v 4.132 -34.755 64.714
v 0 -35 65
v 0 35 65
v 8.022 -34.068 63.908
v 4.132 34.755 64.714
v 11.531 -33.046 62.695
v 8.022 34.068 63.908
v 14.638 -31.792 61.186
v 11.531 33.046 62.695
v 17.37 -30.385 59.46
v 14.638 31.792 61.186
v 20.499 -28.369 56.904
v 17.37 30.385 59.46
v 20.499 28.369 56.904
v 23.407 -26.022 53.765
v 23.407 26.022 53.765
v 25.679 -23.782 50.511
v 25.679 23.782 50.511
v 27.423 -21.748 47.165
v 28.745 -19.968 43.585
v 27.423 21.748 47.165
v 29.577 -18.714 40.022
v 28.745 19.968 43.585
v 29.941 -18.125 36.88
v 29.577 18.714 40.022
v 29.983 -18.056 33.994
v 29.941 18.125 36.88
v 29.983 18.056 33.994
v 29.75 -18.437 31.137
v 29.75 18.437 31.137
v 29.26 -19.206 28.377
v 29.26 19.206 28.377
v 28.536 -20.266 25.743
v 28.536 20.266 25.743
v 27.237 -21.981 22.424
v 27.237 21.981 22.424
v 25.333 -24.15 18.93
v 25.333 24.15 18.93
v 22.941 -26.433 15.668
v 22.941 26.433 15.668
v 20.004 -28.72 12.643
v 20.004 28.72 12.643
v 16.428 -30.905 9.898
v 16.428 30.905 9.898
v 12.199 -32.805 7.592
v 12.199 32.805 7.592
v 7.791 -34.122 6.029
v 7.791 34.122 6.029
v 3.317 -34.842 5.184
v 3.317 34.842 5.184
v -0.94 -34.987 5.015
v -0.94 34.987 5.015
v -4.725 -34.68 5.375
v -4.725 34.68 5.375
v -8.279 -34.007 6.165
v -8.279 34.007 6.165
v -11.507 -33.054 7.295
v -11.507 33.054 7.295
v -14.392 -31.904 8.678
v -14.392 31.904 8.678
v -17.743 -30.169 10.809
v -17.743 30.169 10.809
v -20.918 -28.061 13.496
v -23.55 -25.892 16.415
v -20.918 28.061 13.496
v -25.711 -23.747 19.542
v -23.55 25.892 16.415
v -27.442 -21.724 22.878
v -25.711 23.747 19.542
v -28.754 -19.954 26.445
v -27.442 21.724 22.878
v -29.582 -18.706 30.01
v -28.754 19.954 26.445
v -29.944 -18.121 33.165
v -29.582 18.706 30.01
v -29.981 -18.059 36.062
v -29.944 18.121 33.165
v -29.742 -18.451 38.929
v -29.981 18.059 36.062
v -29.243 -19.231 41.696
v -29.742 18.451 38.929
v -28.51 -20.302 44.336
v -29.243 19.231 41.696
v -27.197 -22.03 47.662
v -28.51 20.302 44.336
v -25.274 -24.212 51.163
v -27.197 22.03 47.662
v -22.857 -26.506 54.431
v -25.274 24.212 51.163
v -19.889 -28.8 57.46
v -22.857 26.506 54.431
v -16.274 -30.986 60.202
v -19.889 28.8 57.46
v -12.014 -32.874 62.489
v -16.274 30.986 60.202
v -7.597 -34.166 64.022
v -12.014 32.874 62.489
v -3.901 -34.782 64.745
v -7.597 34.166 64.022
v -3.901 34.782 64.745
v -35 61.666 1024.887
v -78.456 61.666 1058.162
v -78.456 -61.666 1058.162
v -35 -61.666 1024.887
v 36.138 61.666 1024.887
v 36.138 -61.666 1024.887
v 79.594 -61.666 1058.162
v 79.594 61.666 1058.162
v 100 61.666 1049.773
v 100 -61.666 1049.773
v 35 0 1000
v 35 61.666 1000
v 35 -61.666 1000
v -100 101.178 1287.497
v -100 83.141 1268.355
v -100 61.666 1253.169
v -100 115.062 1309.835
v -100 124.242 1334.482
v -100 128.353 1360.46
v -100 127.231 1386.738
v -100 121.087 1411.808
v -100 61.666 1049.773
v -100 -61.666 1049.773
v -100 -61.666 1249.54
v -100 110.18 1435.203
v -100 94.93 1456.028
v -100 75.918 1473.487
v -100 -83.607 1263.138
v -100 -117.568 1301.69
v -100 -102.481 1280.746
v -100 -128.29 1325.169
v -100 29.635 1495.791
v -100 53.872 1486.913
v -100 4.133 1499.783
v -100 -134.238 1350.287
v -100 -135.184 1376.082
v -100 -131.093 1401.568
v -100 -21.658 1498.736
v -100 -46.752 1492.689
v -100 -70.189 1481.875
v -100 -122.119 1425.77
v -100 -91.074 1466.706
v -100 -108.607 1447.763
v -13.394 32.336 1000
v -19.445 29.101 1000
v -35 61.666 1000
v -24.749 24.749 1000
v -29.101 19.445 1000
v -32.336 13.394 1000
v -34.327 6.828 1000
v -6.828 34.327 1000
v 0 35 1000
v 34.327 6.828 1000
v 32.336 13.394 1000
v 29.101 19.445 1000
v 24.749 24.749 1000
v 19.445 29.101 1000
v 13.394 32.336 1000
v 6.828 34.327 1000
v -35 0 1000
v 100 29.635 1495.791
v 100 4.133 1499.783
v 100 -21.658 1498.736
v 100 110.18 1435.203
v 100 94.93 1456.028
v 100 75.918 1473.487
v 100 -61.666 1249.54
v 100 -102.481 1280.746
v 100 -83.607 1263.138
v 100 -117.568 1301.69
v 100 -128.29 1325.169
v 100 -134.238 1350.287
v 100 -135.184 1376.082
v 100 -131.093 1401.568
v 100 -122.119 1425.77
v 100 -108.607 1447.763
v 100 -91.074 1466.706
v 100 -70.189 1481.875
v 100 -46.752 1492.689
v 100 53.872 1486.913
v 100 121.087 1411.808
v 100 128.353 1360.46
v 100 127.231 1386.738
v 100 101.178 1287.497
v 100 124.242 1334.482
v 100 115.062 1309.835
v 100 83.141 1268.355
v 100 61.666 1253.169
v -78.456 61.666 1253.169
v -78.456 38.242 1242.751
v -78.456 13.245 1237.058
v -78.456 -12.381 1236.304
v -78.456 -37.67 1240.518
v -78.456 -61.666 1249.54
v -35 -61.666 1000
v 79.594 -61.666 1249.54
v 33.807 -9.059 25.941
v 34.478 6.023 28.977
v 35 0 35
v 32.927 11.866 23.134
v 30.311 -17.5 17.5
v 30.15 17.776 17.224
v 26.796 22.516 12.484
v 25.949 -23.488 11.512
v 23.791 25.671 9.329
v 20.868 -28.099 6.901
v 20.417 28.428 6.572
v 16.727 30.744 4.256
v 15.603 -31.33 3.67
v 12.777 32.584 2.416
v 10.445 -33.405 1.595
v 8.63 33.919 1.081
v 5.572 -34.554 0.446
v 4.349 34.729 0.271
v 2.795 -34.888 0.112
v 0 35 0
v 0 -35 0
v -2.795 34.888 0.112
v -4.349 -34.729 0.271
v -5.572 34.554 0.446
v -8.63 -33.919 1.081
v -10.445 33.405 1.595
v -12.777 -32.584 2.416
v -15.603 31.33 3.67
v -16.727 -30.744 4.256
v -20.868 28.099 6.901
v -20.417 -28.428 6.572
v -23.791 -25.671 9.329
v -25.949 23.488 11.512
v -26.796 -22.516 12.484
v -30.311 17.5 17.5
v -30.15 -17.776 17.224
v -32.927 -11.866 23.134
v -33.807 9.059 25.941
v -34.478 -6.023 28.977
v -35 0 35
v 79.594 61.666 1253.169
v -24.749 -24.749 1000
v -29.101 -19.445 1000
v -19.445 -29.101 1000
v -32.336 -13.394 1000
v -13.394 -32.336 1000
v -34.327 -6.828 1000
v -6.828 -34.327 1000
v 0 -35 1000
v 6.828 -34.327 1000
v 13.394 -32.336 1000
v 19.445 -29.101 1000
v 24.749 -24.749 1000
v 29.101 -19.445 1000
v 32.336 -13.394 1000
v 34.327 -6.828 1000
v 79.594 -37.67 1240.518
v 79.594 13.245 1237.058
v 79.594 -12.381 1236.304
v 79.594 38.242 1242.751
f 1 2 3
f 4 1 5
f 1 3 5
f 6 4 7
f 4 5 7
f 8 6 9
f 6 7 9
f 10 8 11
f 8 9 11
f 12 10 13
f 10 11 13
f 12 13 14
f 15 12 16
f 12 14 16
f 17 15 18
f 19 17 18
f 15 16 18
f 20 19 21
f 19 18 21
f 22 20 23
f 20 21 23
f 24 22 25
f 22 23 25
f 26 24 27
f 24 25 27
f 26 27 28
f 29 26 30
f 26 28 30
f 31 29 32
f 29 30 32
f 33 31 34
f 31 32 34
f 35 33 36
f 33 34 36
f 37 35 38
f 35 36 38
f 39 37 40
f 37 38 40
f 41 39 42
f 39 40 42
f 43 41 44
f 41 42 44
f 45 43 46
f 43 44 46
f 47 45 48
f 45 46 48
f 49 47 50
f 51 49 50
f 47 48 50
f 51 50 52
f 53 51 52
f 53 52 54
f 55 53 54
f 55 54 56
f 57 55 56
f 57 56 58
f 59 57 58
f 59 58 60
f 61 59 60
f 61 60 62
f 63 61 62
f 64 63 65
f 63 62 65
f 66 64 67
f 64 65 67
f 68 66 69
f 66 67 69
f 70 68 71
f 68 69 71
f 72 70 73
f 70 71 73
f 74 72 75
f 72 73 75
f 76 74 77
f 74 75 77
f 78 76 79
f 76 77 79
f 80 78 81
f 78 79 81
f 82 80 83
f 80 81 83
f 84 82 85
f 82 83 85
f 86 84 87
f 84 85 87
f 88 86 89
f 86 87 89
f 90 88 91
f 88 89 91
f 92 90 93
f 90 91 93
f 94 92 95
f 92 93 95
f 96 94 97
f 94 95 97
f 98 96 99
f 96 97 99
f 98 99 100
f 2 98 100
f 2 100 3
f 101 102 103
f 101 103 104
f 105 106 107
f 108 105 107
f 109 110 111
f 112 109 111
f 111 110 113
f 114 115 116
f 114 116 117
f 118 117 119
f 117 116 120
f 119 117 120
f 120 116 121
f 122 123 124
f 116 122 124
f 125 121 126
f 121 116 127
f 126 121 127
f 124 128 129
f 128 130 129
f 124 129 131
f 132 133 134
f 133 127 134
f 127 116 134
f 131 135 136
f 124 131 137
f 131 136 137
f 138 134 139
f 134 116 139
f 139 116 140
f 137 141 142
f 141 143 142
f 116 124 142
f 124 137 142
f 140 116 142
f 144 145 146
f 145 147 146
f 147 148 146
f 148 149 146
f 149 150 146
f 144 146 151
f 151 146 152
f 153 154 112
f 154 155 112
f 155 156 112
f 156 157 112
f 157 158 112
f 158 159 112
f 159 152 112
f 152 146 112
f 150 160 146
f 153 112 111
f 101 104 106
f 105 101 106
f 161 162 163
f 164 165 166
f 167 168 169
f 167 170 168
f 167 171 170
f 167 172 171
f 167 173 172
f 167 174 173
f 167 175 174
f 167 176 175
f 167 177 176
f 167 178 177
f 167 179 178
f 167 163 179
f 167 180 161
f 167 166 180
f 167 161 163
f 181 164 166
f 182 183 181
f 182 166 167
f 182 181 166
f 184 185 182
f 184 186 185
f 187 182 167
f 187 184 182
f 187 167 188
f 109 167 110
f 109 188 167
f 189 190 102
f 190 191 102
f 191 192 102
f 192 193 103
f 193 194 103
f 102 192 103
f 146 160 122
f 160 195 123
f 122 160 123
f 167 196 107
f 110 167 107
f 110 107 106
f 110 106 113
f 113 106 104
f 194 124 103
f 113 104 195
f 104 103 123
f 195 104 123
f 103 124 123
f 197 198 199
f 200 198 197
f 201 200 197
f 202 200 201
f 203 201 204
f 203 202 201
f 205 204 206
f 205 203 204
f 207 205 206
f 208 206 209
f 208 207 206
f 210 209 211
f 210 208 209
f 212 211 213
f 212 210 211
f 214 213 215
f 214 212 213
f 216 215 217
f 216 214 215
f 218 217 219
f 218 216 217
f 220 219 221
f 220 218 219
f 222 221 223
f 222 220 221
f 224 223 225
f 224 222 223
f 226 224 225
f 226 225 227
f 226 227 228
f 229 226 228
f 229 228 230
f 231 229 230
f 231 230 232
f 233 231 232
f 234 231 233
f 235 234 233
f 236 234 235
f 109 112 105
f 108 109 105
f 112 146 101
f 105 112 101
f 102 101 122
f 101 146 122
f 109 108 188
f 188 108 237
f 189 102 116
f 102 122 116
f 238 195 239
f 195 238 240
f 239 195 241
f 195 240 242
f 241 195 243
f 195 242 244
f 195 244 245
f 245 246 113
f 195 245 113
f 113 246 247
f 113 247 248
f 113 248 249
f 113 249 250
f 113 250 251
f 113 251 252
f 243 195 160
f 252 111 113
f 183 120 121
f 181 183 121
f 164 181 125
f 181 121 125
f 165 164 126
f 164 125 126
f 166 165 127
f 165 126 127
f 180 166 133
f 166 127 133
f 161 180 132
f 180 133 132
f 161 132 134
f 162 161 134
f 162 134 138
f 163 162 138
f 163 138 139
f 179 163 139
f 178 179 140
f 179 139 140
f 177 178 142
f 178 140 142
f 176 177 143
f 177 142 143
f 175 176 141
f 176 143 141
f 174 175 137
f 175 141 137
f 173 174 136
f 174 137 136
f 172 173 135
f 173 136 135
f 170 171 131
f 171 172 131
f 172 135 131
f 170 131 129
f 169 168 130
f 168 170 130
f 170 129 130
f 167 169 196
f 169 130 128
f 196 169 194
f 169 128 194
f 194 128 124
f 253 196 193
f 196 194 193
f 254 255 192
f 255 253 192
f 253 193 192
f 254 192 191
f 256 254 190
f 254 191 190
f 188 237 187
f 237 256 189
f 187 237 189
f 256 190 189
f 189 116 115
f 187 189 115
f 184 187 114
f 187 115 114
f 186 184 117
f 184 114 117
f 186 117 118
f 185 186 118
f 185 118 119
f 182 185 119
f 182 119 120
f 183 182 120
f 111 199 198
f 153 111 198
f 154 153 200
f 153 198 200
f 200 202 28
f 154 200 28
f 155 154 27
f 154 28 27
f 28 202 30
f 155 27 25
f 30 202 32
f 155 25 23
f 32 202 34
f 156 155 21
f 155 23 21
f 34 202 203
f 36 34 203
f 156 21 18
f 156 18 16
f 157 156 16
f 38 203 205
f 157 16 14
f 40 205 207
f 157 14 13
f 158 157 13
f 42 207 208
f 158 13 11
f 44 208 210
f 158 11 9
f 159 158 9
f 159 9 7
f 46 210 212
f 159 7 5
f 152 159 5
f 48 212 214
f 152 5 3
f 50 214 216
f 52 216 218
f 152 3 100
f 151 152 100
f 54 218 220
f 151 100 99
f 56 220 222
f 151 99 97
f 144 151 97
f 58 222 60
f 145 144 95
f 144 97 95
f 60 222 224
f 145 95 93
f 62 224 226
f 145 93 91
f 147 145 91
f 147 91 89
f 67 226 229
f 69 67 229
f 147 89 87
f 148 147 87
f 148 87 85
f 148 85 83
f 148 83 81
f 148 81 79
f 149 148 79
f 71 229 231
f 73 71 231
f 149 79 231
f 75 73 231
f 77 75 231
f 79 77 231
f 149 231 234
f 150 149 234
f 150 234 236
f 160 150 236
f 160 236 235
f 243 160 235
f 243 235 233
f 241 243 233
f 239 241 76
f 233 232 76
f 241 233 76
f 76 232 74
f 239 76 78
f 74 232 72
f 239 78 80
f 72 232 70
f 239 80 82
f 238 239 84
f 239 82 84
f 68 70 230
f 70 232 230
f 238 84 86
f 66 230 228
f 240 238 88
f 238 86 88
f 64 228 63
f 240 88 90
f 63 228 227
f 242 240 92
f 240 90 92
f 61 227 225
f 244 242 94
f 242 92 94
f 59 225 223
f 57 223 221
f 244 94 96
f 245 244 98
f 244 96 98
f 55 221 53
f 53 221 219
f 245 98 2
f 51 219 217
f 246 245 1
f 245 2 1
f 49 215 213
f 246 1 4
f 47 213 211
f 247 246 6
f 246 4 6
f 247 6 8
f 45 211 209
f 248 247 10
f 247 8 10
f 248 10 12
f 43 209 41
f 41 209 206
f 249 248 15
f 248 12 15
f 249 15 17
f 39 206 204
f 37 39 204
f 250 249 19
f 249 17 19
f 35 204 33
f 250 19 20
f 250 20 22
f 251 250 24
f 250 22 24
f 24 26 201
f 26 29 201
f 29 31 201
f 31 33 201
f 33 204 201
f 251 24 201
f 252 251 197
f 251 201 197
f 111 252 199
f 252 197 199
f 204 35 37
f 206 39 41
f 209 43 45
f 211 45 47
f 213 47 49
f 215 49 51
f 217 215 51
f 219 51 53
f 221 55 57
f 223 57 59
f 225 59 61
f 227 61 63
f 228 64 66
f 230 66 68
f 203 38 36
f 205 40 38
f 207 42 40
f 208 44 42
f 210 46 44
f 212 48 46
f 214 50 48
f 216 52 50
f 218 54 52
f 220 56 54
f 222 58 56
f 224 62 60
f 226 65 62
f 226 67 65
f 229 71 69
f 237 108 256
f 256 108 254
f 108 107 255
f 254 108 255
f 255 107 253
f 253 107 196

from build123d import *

# Parameters (mm, degrees)
SKETCH1_R           = 35.00000000000001
BOSS_EXTRUDE1_DEPTH = 1000
CUT_EXTRUDE1_DEPTH  = 750
SKETCH22_R          = 30
CUT_EXTRUDE2_DEPTH  = 750
SKETCH23_W          = 366.89615803266116
SKETCH23_H          = 201.36798200180615
BOSS_EXTRUDE2_DEPTH = 500
CUT_EXTRUDE4_DEPTH  = 500
SKETCH26_W          = 450.22684379892416
SKETCH26_H          = 39.01754234256356
CUT_EXTRUDE5_DEPTH  = 500
BOSS_EXTRUDE3_REACH = 1516.531
SKETCH27_R          = 131.99999999999994
CUT_EXTRUDE8_DEPTH  = 1520.3228139489233


with BuildPart() as part:
    # Sketch1 → Boss-Extrude1 (new body)
    with BuildSketch(Plane.XY):
        Circle(SKETCH1_R)
    extrude(amount=BOSS_EXTRUDE1_DEPTH)

    # Sketch21 → Cut-Extrude1 (cut, symmetric)
    with BuildSketch(Plane(origin=(0, 0, 0), x_dir=(1, 0, 0), z_dir=(0, 1, 0))):
        with BuildLine():
            ThreePointArc((0, 0), (-24.748737341529168, -10.251262658470836), (-35.00000000000001, -35.00000000000001))
            Line((-35.00000000000001, -35.00000000000001), (-35.00000000000001, 14.56189922191023))
            Line((-35.00000000000001, 14.56189922191023), (35.00000000000001, 14.56189922191023))
            Line((35.00000000000001, 14.56189922191023), (35.00000000000001, -35.000000000000085))
            ThreePointArc((35.00000000000001, -35.000000000000085), (24.748737341529196, -10.251262658470868), (0, 0))
        make_face()
    extrude(amount=CUT_EXTRUDE1_DEPTH, both=True, mode=Mode.SUBTRACT)

    # Sketch22 → Cut-Extrude2 (cut, symmetric)
    with BuildSketch(Plane(origin=(0, 0, 0), x_dir=(1, 0, 0), z_dir=(0, 1, 0))):
        with Locations(Location((0, -34.999999999999964, 0), (0, 0, 270))):
            Circle(SKETCH22_R)
    extrude(amount=CUT_EXTRUDE2_DEPTH, both=True, mode=Mode.SUBTRACT)

    # Sketch23 → Boss-Extrude2 (add)
    with BuildSketch(Plane.XY.offset(1000)):
        Rectangle(SKETCH23_W, SKETCH23_H)
    extrude(amount=BOSS_EXTRUDE2_DEPTH)

    # Sketch24 → Cut-Extrude4 (cut)
    with BuildSketch(Plane.XZ.offset(100.68399100090306)):
        Polygon((79.59360487116518, 1500), (-78.45567005550114, 1500), (-78.45567005550113, 1058.1623604619979), (-34.99999999999988, 1024.8865781005384), (36.137934815664146, 1024.8865781005381), (79.59360487116518, 1058.1623604619977), align=None)
        Polygon((-100, 1049.7731562010758), (-100, 1500), (-183.44807901633058, 1500), (-183.44807901633058, 1000), (-35, 1000), align=None)
        Polygon((100, 1049.7731562010758), (35.00000000000001, 1000), (183.44807901633058, 1000), (183.44807901633058, 1500), (100, 1500), align=None)
    extrude(amount=-CUT_EXTRUDE4_DEPTH, mode=Mode.SUBTRACT)

    # Sketch26 → Cut-Extrude5 (cut)
    with BuildSketch(Plane.ZY.offset(100)):
        with Locations((1274.886578100538, 81.1752198296213)):
            Rectangle(SKETCH26_W, SKETCH26_H)
        Polygon((1000, 61.66644865833952), (1049.7731562010758, 61.66644865833952), (1049.7731562010758, 100.68399100090308), (1024.8865781005381, 100.68399100090308), (1000, 100.68399100090308), align=None)
        Polygon((1500, -100.68399100090306), (1500, -61.666448658339505), (1049.7731562010758, -61.666448658339505), (1049.7731562010758, -100.68399100090305), align=None)
        Polygon((1049.7731562010758, -100.68399100090305), (1049.7731562010758, -61.66644865833949), (1000, -61.666448658339505), (1000, -100.68399100090306), align=None)
    extrude(amount=-CUT_EXTRUDE5_DEPTH, mode=Mode.SUBTRACT)

    # Boss-Extrude3: up to this face of the body (flat: up to its plane)
    boss_extrude3_end = Plane(part.part.faces().sort_by_distance((100, 0, 1274.886578101))[0])
    # Sketch27 → Boss-Extrude3 (add, up to the picked face)
    with BuildSketch(Plane.ZY.offset(100), mode=Mode.PRIVATE) as boss_extrude3_sk1:
        with Locations((1368, -3.431949648798167)):
            Circle(SKETCH27_R)
    boss_extrude3_tool1 = split(extrude(boss_extrude3_sk1.sketch, amount=-BOSS_EXTRUDE3_REACH, mode=Mode.PRIVATE), bisect_by=boss_extrude3_end, keep=Keep.BOTH, mode=Mode.PRIVATE)
    add(boss_extrude3_tool1.solids().sort_by(Axis((-100, -3.43195, 1368), (1, 0, 0)))[0])

    # Sketch28 → Cut-Extrude8 (cut, through all)
    with BuildSketch(Plane.ZY.offset(100)):
        with BuildLine():
            Line((1576.6741063083334, 113.68167915660561), (1386.7378452368366, 127.23133194125066))
            ThreePointArc((1386.7378452368366, 127.2313319412505), (1442.39663439627, 105.60538703230257), (1482.8311740680433, 61.66644865833952))
            Line((1482.8311740680433, 61.66644865833952), (1500, 61.66644865833952))
            Line((1500, 61.66644865833953), (1500, -3.4319477522261153))
            Line((1500, -3.4319477522261153), (1500, -61.666448658339505))
            Line((1500, -61.666448658339505), (1486.4598798121447, -61.666448658339505))
            ThreePointArc((1486.4598798121447, -61.666448658339476), (1437.7748025104354, -115.48317425000337), (1368, -135.43194964879822))
            Line((1368, -135.4319496487982), (1367.9999999999998, -201.07935807583712))
            Line((1367.9999999999998, -201.07935807583712), (1604.9218917009885, -125.07936404321737))
            Line((1604.9218917009885, -125.07936404321737), (1576.6741063083334, 113.68167915660561))
        make_face()
        with BuildLine():
            Line((1500, -61.666448658339505), (1500, -3.4319477522261153))
            ThreePointArc((1500, -3.431947752226116), (1496.5704169816079, -33.32589346983822), (1486.4598798121447, -61.666448658339476))
            Line((1486.4598798121447, -61.666448658339505), (1500, -61.666448658339505))
        make_face()
        with BuildLine():
            Line((1500, 61.66644865833952), (1482.8311740680433, 61.66644865833952))
            ThreePointArc((1482.8311740680433, 61.66644865833952), (1495.63564324576, 30.23023348362874), (1500, -3.431947752226116))
            Line((1500, -3.4319477522261153), (1500, 61.66644865833953))
        make_face()
    extrude(amount=-CUT_EXTRUDE8_DEPTH, mode=Mode.SUBTRACT)


solid = part.part
